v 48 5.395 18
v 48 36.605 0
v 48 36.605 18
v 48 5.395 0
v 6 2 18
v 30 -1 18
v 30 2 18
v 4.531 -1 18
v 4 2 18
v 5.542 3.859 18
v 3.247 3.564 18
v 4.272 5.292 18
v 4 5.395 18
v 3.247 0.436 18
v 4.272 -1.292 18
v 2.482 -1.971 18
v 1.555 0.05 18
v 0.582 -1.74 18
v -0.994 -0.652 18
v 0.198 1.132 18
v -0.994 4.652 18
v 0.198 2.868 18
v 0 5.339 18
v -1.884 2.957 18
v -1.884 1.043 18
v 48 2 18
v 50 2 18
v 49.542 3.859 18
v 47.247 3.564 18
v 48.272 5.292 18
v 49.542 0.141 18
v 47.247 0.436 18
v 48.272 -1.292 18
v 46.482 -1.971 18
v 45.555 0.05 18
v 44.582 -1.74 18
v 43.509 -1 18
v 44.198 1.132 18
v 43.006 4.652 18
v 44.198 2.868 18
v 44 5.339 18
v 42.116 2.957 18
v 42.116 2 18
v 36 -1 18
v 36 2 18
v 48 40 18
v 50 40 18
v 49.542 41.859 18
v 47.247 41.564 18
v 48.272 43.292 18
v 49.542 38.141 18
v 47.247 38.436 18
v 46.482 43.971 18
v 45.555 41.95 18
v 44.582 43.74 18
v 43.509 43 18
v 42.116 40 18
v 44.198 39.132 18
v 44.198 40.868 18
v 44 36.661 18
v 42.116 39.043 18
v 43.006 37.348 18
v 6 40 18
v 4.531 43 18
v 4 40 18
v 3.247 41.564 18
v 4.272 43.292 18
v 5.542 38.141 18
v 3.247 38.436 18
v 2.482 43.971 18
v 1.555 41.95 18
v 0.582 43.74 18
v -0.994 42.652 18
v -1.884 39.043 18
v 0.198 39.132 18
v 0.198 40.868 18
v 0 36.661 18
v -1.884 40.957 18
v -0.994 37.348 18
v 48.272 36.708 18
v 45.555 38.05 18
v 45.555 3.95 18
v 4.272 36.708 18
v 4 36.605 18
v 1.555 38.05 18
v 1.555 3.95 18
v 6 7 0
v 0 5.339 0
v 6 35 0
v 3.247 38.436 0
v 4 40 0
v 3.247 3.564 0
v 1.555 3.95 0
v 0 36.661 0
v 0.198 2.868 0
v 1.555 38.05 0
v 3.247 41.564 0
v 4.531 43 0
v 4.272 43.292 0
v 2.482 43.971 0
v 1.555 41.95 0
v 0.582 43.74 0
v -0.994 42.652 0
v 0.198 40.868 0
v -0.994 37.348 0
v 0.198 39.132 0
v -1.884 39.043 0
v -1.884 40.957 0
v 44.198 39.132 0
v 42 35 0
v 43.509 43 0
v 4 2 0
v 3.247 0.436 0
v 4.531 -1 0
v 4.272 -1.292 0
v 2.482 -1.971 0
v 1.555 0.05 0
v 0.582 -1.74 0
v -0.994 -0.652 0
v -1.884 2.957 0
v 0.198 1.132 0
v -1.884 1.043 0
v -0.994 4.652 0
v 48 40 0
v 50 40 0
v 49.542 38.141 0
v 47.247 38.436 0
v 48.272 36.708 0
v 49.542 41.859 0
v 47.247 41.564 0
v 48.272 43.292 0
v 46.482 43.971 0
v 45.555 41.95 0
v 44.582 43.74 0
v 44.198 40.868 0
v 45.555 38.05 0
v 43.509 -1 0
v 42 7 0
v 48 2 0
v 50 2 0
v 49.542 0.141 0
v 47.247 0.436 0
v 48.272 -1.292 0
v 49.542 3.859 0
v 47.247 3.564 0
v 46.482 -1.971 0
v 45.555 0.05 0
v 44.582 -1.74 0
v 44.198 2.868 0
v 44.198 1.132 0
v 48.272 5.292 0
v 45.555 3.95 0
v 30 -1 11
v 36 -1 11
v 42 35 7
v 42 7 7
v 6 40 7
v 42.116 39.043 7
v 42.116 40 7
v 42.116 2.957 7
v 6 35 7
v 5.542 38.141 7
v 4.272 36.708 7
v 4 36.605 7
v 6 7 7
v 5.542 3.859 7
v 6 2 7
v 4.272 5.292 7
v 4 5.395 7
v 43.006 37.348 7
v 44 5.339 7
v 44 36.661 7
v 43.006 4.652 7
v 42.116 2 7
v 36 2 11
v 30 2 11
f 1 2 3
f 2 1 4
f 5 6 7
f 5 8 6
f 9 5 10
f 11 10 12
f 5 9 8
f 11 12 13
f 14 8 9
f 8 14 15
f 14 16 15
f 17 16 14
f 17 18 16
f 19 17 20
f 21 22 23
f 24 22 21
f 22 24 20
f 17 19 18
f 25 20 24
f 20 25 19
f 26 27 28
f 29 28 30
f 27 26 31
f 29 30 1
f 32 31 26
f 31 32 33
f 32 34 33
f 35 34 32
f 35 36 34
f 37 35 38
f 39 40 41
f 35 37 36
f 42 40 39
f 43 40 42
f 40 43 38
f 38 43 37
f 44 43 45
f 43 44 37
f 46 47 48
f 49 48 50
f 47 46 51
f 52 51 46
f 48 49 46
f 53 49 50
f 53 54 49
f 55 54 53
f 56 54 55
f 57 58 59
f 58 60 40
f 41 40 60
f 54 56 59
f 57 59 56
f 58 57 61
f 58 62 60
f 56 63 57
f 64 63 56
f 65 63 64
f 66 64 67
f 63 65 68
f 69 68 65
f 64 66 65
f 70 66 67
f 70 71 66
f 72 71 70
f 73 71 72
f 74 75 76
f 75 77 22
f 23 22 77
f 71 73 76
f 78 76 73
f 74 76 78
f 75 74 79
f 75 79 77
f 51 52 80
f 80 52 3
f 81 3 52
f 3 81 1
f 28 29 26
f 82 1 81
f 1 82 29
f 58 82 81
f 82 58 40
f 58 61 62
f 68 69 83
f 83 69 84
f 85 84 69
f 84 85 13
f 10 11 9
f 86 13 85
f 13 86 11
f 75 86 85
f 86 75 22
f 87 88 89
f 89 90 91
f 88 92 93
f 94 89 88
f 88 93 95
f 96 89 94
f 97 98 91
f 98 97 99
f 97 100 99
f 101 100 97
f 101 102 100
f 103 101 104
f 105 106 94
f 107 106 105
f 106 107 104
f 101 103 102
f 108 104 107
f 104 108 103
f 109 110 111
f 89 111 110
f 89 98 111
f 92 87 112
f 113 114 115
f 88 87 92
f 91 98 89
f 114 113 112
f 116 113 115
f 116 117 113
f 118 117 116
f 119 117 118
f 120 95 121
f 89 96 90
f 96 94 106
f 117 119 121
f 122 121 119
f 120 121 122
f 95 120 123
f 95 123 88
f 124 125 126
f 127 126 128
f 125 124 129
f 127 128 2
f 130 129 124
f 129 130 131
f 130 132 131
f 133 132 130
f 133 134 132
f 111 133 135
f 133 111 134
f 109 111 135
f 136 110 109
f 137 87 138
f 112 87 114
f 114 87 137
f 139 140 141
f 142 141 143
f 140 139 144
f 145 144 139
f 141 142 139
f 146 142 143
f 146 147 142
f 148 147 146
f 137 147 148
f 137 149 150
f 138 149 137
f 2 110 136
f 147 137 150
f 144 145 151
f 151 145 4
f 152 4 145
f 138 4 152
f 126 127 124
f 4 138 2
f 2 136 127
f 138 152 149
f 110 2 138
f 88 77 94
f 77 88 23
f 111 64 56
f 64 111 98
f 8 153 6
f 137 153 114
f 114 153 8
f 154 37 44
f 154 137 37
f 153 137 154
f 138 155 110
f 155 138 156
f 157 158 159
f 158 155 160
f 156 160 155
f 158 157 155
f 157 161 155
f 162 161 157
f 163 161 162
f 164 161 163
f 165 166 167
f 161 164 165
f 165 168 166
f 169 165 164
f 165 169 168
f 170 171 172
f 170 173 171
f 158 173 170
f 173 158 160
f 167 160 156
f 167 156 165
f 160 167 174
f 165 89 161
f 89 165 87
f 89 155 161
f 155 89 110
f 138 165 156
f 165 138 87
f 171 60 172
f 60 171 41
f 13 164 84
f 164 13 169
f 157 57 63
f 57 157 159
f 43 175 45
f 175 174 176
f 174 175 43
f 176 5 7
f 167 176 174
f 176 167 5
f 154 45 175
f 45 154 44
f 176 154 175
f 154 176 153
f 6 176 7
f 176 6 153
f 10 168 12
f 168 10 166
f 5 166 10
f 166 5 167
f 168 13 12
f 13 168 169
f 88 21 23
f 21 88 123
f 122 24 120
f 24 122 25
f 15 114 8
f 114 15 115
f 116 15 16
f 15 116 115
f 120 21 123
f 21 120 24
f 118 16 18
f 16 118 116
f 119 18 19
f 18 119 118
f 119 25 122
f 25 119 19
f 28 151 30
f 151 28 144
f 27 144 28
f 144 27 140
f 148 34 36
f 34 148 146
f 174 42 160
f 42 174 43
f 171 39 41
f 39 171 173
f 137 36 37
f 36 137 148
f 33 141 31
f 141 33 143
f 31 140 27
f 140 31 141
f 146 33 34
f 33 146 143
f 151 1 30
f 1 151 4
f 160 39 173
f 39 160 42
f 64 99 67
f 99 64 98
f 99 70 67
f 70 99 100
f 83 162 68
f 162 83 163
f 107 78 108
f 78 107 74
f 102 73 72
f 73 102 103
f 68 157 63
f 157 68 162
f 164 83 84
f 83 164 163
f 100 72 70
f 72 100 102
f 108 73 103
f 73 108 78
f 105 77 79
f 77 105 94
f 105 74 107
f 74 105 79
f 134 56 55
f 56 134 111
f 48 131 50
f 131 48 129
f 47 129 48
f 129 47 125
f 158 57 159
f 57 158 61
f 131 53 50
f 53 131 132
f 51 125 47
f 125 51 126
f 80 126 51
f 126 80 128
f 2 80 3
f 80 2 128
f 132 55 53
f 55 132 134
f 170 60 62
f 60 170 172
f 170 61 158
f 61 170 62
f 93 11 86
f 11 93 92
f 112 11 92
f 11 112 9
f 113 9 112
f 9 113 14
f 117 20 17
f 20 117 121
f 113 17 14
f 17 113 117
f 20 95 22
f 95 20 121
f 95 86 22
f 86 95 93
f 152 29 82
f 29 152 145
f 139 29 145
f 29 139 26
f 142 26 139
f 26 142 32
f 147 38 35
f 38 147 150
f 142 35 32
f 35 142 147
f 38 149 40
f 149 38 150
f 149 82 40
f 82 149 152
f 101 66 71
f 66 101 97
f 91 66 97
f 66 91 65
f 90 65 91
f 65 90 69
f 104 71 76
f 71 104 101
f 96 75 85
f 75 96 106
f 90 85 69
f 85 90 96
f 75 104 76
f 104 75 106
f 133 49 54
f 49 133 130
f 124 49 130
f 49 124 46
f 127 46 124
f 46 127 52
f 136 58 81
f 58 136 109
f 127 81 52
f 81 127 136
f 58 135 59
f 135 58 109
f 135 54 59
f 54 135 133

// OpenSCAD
/* 
 * 2016, bruno.keymolen@gmail.com
 */

module base1()
{
    difference()
    {
        translate([0,-1,0])
        {
            cube(size=[48, 44, 18], center=false);
        }
        translate([6,7,0])
        {
        cube(size=[36, 28, 7], center=false);
        }
        translate([4,2,7])
        {
        cube(size=[40, 38, 11], center=false);
        }
        translate([30,-5,11])
        {
        cube(size=[6,9,10], center=false);
        }
    }
}


module base2()
{
    base1();
    translate([2,2,0])
    cylinder(h=18, r1=4, r2=4);
    translate([46,2,0])
    cylinder(h=18, r1=4, r2=4);
    translate([2,40,0])
    cylinder(h=18, r1=4, r2=4);
    translate([46,40,0])
    cylinder(h=18, r1=4, r2=4);
}

module base3()
{
    difference()
    {
        base2();
        translate([2,2,0])
        cylinder(h=18, r1=2, r2=2);
        translate([46,2,0])
        cylinder(h=18, r1=2, r2=2);
        translate([2,40,0])
        cylinder(h=18, r1=2, r2=2);
        translate([46,40,0])
        cylinder(h=18, r1=2, r2=2);
    }
}

base3();
